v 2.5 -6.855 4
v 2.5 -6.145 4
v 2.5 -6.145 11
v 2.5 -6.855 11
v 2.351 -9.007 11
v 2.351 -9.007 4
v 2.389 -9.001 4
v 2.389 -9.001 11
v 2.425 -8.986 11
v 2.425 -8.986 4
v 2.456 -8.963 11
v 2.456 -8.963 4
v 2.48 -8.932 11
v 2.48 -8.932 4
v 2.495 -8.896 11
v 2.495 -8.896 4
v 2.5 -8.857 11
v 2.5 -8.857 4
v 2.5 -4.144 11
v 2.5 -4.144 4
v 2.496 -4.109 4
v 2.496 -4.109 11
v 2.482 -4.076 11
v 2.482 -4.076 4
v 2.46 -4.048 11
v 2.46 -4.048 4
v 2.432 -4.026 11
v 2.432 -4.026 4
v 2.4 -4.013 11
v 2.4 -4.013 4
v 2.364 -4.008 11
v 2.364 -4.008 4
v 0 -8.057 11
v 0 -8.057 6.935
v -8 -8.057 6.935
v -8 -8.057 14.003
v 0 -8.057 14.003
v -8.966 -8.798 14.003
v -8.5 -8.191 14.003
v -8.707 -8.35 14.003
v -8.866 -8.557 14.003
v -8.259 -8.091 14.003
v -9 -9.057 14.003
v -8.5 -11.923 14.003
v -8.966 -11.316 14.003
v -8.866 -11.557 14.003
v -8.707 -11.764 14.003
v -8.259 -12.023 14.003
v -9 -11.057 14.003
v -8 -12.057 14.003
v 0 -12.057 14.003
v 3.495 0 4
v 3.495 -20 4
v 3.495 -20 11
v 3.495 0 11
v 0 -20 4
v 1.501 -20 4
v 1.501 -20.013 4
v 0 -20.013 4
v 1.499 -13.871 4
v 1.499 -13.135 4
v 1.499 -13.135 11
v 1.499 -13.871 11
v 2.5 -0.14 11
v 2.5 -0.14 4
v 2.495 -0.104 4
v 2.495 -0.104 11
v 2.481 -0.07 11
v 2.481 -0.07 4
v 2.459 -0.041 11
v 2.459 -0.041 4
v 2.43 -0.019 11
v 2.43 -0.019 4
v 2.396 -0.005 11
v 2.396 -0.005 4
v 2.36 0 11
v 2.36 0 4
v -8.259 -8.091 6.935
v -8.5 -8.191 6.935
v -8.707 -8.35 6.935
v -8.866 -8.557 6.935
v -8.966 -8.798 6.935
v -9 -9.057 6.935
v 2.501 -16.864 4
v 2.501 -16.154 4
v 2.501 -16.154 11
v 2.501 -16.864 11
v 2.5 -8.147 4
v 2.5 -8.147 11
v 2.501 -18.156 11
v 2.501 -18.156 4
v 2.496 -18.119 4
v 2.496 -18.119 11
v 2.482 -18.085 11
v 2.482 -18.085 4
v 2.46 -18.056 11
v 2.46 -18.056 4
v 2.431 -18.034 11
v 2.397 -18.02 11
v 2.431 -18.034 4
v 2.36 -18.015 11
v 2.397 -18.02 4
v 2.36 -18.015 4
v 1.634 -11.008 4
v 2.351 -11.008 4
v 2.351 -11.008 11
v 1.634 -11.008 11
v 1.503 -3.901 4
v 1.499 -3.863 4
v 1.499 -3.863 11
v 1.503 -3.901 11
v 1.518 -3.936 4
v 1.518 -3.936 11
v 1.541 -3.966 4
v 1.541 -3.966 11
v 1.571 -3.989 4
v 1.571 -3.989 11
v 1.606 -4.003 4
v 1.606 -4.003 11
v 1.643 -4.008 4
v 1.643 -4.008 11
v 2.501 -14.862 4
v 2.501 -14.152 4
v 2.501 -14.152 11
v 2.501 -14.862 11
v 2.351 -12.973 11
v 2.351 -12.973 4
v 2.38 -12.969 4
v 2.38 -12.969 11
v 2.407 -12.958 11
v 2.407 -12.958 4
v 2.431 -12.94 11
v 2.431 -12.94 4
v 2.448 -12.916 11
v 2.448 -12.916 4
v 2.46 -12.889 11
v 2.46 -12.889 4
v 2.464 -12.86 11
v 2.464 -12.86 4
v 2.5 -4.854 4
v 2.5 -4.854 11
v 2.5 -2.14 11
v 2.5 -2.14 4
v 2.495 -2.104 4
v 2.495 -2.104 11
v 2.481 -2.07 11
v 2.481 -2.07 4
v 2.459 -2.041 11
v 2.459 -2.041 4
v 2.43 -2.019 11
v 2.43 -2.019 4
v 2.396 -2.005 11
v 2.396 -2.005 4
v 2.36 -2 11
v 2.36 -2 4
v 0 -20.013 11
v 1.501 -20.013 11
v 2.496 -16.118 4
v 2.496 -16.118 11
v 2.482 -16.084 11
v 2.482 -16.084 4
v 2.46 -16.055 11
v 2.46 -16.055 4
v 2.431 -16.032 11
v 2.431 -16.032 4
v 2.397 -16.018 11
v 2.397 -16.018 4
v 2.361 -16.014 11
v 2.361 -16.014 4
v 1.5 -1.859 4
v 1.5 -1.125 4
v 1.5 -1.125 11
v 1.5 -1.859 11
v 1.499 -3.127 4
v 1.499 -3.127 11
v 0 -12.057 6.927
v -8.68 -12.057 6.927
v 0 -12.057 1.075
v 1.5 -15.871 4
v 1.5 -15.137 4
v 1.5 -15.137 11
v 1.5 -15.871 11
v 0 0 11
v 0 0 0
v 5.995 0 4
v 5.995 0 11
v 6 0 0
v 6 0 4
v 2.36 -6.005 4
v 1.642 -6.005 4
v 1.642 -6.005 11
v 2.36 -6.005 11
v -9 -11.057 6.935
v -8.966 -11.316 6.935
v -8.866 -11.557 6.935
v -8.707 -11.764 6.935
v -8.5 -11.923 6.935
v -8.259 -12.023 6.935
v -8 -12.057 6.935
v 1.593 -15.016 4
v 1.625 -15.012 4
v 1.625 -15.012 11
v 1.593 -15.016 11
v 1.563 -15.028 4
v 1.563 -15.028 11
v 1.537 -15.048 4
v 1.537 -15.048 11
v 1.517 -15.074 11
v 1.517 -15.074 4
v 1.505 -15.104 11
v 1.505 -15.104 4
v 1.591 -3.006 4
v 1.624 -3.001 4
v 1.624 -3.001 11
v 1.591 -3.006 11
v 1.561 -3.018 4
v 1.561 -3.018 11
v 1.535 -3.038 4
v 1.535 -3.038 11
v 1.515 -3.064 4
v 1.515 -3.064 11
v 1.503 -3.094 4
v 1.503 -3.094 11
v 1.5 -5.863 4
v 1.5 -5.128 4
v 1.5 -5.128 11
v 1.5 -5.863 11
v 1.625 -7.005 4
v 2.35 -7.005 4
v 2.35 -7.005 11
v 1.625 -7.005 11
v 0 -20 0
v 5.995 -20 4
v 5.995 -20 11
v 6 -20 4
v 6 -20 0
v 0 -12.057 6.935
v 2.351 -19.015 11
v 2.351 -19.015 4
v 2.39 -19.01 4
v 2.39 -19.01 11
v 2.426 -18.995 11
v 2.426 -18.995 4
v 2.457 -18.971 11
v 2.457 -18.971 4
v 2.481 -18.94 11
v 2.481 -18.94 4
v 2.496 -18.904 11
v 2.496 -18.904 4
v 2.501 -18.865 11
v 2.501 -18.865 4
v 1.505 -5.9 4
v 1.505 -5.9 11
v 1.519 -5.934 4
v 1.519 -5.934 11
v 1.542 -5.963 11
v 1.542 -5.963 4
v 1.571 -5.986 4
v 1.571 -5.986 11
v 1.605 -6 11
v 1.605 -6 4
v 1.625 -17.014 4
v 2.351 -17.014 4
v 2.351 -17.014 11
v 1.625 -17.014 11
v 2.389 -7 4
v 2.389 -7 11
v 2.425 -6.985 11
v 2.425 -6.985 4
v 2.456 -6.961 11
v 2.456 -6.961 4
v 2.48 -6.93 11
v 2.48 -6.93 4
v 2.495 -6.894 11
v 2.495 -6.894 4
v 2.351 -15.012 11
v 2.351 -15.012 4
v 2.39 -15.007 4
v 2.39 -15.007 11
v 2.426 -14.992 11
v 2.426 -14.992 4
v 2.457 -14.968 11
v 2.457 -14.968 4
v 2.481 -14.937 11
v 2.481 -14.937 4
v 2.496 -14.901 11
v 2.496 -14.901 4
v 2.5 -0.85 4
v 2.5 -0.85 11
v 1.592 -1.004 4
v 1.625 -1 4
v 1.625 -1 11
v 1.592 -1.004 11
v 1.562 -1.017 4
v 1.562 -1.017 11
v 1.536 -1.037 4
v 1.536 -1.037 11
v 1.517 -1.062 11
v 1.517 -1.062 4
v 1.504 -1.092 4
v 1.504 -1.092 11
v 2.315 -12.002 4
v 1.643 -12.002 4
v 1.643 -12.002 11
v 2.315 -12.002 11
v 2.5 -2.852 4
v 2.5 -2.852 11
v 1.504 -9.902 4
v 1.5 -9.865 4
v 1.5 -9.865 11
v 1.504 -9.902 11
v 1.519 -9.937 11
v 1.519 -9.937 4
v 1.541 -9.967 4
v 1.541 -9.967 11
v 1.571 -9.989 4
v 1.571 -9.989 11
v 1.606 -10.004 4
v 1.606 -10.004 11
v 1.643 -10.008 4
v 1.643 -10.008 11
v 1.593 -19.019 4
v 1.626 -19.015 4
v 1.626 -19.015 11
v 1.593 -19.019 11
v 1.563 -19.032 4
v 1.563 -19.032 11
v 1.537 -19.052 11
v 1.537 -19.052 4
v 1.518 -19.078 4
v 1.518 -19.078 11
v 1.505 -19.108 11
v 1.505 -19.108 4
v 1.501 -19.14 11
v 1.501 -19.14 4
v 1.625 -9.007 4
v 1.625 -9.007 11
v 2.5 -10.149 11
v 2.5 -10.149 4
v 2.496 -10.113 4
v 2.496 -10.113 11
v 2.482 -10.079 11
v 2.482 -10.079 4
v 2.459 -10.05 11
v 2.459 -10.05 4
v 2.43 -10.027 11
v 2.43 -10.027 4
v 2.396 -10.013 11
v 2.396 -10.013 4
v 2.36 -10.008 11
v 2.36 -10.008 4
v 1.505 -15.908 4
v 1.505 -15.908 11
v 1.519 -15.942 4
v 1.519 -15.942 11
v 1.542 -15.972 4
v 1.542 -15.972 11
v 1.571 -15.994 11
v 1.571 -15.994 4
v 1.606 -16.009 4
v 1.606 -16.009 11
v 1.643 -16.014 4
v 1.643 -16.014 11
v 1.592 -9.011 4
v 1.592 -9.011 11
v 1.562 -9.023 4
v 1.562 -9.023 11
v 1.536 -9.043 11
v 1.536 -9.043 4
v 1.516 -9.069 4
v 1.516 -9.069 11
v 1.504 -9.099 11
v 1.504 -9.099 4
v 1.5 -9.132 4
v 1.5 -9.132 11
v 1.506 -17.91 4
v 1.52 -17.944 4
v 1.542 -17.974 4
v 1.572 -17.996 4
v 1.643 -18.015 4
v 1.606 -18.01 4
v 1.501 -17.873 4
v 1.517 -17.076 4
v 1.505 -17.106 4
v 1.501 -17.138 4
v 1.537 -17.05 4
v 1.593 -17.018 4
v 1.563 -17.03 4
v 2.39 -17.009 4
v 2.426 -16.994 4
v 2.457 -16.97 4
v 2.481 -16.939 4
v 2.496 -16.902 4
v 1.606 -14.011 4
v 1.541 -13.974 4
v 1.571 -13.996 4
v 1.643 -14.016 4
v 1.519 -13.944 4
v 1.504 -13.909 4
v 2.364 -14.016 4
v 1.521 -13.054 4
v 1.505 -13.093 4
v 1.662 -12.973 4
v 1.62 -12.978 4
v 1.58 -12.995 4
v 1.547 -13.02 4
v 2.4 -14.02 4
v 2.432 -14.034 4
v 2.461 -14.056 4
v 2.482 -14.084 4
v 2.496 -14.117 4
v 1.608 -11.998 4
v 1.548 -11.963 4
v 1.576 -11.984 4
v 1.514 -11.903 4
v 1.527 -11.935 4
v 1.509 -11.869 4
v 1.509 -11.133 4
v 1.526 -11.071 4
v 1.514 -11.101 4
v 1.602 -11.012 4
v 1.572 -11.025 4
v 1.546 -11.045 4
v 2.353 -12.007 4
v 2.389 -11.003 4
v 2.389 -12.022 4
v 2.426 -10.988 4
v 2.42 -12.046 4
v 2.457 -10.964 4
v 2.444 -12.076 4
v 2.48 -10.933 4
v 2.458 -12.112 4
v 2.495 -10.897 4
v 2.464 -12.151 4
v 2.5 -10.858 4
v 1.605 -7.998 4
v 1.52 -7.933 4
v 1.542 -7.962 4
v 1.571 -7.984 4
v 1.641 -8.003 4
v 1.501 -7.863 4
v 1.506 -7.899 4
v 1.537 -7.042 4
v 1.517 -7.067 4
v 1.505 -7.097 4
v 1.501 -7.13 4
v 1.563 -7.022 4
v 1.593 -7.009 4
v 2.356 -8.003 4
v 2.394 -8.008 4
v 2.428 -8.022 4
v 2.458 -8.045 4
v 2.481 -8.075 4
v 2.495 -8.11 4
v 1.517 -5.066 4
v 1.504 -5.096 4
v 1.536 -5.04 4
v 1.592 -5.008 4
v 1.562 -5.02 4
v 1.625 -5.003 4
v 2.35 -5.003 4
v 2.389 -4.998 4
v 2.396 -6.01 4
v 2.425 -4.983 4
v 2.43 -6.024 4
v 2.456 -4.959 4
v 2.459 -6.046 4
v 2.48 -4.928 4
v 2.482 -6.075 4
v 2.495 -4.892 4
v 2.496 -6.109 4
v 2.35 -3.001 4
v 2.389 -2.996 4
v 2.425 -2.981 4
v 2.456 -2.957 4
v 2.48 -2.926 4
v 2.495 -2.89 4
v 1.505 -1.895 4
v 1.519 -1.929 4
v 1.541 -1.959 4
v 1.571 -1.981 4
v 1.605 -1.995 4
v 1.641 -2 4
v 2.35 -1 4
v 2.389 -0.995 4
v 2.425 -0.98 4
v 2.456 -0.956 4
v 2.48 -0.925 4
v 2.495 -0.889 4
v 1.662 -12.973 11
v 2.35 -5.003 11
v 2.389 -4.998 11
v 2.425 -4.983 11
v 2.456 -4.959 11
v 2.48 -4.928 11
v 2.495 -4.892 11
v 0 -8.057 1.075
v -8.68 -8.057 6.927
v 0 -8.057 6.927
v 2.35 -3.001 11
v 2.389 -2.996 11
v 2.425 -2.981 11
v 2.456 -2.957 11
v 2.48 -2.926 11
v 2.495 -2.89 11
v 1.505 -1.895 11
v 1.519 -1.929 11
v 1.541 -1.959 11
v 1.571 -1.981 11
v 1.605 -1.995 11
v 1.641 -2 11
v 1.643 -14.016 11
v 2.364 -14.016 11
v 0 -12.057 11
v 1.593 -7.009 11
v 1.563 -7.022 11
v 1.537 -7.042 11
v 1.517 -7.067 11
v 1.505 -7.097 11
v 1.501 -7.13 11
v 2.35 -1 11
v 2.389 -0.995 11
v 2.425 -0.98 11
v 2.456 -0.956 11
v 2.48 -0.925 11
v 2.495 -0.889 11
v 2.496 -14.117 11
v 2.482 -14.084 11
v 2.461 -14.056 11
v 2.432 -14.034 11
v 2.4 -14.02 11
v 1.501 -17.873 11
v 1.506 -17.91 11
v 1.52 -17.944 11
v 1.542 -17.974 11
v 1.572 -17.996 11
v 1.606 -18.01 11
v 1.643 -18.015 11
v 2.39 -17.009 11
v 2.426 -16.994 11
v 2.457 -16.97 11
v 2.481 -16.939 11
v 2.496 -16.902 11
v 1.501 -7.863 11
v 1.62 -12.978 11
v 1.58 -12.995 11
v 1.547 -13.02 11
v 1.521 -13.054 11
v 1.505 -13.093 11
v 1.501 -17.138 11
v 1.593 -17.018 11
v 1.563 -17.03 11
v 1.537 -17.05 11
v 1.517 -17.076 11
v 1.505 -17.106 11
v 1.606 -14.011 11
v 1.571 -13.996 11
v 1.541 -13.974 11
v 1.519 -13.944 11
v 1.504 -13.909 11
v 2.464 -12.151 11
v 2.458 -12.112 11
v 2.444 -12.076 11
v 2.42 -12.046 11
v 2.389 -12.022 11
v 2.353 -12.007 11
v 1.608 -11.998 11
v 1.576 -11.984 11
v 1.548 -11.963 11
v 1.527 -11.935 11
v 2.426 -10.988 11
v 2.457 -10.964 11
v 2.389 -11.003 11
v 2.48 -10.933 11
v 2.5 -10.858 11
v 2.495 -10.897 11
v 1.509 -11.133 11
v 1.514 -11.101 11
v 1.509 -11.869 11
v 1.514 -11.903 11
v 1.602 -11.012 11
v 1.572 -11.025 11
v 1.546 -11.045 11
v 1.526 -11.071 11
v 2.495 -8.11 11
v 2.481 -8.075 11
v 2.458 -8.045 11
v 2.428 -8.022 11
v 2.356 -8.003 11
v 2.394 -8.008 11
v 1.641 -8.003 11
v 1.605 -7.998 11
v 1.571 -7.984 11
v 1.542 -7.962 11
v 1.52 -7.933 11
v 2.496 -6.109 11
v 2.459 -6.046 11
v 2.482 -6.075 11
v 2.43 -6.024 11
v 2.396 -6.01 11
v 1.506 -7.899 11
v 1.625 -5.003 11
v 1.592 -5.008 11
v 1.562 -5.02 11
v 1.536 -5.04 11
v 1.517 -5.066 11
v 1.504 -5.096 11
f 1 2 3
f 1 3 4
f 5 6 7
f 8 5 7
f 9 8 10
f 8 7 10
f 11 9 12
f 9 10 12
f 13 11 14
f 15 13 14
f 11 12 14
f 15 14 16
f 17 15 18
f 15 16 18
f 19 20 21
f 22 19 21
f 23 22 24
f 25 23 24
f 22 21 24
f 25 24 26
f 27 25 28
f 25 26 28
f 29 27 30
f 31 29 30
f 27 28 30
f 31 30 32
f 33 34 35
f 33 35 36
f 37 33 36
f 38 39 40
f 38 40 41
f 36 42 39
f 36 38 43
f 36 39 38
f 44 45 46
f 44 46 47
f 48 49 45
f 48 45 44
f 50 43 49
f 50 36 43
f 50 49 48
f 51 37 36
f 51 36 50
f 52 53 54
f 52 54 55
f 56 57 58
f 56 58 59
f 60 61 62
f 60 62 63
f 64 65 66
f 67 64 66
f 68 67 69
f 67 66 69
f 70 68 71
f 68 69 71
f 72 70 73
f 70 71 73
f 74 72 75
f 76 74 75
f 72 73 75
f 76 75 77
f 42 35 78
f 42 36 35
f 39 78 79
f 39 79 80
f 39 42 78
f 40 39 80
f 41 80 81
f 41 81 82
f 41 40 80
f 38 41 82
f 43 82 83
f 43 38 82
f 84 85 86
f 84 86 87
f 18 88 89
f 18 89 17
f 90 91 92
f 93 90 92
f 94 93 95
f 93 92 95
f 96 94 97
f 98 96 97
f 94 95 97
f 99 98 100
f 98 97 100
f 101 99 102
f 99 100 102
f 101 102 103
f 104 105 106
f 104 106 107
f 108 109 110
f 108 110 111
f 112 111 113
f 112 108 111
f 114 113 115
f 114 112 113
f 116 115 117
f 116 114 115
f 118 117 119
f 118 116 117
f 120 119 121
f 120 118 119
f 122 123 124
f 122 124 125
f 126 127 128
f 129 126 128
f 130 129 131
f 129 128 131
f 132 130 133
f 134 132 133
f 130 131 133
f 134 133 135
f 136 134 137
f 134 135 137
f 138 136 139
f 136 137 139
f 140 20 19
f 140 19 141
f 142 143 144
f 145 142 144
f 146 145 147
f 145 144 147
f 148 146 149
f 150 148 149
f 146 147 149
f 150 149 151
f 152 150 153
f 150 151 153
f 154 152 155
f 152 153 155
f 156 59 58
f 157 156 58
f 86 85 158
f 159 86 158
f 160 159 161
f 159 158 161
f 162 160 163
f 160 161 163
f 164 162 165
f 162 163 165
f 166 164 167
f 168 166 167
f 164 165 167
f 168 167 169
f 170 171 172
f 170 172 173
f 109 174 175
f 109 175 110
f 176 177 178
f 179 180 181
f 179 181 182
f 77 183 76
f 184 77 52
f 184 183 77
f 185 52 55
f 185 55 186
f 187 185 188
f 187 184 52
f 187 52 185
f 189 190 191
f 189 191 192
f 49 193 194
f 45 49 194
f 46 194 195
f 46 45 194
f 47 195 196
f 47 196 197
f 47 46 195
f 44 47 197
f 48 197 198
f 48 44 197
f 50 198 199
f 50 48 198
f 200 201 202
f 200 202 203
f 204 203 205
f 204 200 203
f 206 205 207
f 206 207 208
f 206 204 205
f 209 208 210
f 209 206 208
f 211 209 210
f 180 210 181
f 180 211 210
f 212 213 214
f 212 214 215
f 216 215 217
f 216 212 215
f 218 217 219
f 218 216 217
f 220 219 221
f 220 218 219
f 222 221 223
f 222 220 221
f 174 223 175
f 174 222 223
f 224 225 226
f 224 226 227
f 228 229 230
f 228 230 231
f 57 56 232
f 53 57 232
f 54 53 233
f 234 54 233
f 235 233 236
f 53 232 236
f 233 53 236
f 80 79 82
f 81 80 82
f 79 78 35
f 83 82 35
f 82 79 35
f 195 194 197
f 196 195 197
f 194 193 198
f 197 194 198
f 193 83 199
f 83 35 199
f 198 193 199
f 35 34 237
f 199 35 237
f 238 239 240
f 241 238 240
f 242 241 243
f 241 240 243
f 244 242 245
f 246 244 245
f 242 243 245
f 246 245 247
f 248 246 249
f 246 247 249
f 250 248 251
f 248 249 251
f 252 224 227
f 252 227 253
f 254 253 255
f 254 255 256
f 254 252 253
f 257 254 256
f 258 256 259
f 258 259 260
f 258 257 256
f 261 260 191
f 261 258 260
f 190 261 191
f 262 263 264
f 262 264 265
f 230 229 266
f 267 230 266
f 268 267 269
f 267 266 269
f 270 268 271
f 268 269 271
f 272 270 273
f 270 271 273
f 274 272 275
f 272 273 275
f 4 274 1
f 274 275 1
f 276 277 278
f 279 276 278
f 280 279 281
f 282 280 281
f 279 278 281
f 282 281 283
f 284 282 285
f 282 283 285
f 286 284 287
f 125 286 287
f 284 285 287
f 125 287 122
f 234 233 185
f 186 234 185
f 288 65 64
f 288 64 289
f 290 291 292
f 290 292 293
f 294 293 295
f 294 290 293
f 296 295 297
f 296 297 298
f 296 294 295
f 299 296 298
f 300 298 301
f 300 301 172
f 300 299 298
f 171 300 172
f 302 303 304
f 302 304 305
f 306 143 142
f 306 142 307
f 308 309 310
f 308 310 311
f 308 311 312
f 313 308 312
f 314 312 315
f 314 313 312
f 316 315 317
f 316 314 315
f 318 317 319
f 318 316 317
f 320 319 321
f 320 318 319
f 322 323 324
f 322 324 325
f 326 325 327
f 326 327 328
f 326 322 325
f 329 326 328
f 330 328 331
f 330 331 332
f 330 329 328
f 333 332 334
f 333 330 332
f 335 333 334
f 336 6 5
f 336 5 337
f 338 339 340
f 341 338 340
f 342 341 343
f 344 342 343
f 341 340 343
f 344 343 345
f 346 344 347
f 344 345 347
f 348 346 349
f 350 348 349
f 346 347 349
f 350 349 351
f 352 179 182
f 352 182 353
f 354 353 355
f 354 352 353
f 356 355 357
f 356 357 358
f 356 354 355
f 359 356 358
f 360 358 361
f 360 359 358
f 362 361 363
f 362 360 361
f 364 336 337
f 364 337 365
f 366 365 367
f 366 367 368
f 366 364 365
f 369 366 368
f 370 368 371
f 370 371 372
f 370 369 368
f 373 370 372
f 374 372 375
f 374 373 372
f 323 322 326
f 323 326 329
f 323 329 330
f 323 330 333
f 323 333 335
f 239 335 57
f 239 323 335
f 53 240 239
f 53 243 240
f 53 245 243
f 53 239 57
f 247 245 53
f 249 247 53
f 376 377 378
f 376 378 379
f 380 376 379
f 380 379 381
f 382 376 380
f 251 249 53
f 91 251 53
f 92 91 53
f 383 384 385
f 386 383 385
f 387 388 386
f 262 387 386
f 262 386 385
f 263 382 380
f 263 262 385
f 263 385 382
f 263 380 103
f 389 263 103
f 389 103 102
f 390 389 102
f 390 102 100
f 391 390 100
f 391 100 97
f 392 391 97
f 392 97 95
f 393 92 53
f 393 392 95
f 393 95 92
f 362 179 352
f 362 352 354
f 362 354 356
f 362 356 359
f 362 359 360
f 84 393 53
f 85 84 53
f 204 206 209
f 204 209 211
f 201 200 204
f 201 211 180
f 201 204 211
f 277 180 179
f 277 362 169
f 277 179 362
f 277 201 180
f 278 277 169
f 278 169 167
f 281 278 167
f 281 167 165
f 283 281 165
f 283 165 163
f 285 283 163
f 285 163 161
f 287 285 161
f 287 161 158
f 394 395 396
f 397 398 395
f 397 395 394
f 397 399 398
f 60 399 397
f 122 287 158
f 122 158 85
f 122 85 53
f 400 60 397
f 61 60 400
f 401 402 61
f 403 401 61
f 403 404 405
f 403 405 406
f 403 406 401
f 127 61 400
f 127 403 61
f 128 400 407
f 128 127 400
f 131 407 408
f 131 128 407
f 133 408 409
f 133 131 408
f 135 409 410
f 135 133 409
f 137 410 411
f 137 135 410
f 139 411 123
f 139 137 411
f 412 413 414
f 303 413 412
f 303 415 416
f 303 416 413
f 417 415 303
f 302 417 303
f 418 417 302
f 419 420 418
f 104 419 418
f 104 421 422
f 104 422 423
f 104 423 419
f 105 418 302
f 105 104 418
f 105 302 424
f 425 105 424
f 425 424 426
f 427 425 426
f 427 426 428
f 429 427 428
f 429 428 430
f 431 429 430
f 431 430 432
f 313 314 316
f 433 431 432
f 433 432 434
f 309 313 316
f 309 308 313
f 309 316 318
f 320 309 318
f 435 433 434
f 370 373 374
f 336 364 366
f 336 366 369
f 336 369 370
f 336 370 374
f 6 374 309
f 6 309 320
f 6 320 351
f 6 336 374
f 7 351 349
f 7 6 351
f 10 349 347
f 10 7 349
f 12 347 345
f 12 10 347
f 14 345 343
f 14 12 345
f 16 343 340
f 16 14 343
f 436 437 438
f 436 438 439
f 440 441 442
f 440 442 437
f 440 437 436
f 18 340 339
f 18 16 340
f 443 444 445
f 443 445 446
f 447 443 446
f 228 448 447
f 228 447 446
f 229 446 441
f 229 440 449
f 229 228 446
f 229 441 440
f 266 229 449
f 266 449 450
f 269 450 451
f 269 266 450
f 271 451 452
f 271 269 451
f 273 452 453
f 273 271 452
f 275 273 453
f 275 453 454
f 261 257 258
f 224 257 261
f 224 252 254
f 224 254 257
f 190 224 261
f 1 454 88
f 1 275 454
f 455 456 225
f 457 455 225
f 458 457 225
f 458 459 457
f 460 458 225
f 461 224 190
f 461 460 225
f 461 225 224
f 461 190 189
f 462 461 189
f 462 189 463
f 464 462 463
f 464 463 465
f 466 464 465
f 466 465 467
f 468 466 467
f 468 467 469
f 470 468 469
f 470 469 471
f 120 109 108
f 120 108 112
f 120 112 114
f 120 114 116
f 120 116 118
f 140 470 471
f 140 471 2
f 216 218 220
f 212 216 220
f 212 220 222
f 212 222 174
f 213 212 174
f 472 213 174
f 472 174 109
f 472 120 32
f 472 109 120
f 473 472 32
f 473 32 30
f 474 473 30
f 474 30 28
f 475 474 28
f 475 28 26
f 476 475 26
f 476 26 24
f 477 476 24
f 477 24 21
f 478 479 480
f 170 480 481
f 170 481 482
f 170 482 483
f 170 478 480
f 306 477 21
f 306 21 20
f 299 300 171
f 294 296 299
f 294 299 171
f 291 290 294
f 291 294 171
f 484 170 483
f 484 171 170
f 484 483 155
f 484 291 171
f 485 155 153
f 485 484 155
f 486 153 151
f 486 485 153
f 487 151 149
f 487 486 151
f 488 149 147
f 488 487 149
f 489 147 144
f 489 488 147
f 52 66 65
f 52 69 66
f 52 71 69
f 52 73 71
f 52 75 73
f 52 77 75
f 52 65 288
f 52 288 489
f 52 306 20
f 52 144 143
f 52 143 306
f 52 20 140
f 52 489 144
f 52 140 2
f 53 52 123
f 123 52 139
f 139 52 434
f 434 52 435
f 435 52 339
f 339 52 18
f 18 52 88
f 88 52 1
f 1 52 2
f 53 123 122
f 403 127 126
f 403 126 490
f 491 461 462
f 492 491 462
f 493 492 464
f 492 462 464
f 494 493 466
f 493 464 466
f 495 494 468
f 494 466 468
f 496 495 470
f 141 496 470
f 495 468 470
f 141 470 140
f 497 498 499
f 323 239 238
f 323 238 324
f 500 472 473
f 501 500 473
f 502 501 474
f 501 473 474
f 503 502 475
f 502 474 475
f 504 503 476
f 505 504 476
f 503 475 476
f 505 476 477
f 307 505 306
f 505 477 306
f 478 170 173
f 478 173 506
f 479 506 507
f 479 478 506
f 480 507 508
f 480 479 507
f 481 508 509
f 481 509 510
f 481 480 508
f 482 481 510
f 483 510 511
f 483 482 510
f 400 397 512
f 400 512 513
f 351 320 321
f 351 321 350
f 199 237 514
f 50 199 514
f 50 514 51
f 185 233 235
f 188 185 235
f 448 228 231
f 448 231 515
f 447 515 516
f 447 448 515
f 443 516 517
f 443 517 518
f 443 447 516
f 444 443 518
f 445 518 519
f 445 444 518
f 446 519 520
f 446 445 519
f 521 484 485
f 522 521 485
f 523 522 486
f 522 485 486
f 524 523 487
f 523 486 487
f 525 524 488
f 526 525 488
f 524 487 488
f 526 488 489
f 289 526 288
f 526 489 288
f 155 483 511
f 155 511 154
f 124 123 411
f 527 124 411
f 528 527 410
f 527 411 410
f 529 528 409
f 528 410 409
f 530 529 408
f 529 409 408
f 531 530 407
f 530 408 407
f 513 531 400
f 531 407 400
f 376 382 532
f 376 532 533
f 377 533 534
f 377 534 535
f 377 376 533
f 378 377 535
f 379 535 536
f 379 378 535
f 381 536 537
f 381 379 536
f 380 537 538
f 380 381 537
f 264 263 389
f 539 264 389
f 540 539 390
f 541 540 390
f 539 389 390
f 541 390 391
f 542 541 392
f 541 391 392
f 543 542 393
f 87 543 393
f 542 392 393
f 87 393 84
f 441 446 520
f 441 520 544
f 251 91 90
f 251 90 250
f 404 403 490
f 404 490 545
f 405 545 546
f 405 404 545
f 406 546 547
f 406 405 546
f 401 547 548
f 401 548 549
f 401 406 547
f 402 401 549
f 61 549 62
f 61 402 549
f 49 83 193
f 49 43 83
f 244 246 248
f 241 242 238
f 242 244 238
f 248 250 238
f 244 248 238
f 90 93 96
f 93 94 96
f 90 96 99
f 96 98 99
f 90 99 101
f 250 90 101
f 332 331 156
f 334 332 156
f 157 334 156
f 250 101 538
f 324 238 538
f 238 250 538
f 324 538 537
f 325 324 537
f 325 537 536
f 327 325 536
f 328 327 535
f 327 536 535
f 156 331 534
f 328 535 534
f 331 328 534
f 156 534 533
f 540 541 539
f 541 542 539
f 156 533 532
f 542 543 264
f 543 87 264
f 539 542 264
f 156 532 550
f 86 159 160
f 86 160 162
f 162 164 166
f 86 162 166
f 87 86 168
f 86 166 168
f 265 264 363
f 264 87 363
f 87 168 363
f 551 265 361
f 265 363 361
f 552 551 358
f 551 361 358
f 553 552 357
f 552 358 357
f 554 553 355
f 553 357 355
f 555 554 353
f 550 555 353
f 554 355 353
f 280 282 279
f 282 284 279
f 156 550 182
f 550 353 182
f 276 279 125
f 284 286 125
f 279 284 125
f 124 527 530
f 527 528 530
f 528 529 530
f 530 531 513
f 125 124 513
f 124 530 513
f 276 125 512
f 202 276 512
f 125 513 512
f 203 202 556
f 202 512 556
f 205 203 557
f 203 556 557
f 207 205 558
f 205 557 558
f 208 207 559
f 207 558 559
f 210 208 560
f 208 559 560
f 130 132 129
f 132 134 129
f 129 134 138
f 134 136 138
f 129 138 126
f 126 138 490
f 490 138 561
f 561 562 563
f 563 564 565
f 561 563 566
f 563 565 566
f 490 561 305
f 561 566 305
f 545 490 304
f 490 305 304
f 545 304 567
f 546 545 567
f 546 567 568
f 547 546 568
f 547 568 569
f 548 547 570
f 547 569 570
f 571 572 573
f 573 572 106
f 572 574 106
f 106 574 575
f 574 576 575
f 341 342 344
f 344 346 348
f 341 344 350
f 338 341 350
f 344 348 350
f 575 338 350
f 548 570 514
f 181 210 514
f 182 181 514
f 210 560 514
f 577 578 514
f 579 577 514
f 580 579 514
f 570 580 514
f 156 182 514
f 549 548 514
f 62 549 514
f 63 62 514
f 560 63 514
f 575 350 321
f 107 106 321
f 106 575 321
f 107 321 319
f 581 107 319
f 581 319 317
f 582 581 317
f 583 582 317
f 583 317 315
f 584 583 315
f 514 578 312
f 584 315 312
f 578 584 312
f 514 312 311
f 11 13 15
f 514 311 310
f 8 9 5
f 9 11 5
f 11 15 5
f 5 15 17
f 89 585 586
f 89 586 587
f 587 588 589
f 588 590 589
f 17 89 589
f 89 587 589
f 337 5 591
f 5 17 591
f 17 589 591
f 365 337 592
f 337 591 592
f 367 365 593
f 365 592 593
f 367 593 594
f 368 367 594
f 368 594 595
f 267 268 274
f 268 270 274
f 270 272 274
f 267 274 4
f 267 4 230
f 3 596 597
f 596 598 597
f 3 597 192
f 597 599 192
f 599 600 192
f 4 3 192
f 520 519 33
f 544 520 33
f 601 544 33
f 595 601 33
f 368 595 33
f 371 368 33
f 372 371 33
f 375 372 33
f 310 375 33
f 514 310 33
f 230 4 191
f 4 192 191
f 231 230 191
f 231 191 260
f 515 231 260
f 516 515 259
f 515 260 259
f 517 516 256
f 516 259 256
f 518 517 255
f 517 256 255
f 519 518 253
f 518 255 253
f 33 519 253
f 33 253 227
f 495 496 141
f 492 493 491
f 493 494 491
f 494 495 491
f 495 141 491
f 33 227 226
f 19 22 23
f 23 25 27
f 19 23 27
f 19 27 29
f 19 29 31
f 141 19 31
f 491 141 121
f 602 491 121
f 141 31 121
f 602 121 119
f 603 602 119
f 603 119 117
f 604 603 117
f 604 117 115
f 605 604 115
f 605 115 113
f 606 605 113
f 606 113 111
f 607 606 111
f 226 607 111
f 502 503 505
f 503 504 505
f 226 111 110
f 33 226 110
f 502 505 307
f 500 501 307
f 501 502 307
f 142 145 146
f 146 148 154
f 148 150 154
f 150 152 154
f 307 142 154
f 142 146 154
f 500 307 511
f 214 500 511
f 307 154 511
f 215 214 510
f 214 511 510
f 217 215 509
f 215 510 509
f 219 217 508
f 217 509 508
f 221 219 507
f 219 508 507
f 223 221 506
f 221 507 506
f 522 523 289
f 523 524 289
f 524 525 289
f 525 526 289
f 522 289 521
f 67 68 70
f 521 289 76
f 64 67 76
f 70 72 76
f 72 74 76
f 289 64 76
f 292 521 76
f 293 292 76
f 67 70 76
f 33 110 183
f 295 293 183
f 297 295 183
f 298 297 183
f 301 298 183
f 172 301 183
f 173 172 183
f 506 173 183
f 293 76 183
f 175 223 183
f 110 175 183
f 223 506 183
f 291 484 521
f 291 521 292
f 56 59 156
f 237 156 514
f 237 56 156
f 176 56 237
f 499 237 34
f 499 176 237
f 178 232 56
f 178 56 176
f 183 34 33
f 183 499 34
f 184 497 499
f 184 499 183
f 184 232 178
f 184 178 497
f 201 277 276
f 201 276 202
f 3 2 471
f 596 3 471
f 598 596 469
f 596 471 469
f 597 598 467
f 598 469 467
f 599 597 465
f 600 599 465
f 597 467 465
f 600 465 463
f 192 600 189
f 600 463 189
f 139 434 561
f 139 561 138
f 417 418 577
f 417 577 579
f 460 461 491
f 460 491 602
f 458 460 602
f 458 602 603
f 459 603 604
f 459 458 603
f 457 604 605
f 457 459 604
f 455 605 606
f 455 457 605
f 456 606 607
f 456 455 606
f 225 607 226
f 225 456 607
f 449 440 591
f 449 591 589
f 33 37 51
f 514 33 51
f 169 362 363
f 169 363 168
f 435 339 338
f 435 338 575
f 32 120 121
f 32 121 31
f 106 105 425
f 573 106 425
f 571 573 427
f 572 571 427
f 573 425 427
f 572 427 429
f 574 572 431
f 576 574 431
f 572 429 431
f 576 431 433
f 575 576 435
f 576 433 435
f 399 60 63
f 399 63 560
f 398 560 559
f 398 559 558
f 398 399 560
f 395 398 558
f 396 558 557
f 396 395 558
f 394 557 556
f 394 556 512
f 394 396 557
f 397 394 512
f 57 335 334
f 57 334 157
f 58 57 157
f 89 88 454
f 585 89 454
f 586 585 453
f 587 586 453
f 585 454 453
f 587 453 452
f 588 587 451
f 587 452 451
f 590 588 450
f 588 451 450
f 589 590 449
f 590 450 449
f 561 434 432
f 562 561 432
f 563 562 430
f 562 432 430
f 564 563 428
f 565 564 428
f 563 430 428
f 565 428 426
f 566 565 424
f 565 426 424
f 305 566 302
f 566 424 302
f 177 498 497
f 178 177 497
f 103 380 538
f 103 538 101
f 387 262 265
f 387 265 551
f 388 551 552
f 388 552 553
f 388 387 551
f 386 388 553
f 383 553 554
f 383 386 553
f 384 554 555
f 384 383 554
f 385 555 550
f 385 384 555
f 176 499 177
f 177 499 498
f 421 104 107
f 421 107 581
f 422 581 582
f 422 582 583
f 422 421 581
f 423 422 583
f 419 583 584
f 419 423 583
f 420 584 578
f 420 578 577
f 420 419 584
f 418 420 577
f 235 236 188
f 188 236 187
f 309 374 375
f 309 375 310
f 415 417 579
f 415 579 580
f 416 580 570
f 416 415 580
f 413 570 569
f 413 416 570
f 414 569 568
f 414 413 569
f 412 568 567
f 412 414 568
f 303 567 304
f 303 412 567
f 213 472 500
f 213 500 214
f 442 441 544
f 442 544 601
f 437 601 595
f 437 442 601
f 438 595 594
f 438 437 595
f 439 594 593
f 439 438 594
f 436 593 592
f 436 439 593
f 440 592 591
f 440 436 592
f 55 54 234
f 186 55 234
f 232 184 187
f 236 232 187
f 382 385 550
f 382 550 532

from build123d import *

# Parameters (mm, degrees)
SKETCH_W     = 6
SKETCH_H     = 20
PAD_DEPTH    = 4
PAD001_DEPTH = 7
SKETCH002_W  = 2.5
SKETCH002_H  = 20
PAD002_DEPTH = 7
SKETCH003_W  = 4
SKETCH003_H  = 7.068021
PAD003_DEPTH = 9
PAD004_DEPTH = 4
FILLET_R     = 1
FILLET001_R  = 1


with BuildPart() as part:
    # Sketch → Pad (new body)
    with BuildSketch(Plane.XY):
        with Locations((3, -10)):
            Rectangle(SKETCH_W, SKETCH_H)
    extrude(amount=PAD_DEPTH)

    # Sketch001 (on Face6 of Pad) → Pad001 (join)
    with BuildSketch(Plane.XY.offset(4)):
        with BuildLine():
            Line((0, 0), (2.35958, 0))
            ThreePointArc((2.5, -0.14042), (2.458872, -0.041128), (2.35958, 0))
            Line((2.5, -0.14042), (2.5, -0.850163))
            ThreePointArc((2.350164, -0.999998), (2.456114, -0.956113), (2.5, -0.850163))
            Line((2.350164, -0.999998), (1.624627, -0.999998))
            ThreePointArc((1.624627, -0.999998), (1.536498, -1.036503), (1.499994, -1.124632))
            Line((1.499994, -1.124632), (1.499994, -1.858533))
            ThreePointArc((1.499994, -1.858533), (1.541436, -1.958583), (1.641485, -2.000025))
            Line((1.641485, -2.000025), (2.359631, -2.000025))
            ThreePointArc((2.5, -2.140395), (2.458887, -2.041139), (2.359631, -2.000025))
            Line((2.5, -2.140395), (2.5, -2.851653))
            ThreePointArc((2.350363, -3.00129), (2.456173, -2.957463), (2.5, -2.851653))
            Line((2.350363, -3.00129), (1.623935, -3.00129))
            ThreePointArc((1.623935, -3.00129), (1.535246, -3.038027), (1.49851, -3.126716))
            Line((1.49851, -3.126716), (1.49851, -3.86339))
            ThreePointArc((1.49851, -3.86339), (1.54088, -3.965679), (1.643169, -4.008049))
            Line((1.643169, -4.008049), (2.364441, -4.008049))
            ThreePointArc((2.500184, -4.143792), (2.460426, -4.047807), (2.364441, -4.008049))
            Line((2.500184, -4.143792), (2.500184, -4.853508))
            ThreePointArc((2.35038, -5.003311), (2.456307, -4.959435), (2.500184, -4.853508))
            Line((2.35038, -5.003311), (1.6247, -5.003311))
            ThreePointArc((1.6247, -5.003311), (1.536481, -5.039852), (1.49994, -5.128071))
            Line((1.49994, -5.128071), (1.49994, -5.863058))
            ThreePointArc((1.49994, -5.863058), (1.541531, -5.963466), (1.641939, -6.005056))
            Line((1.641939, -6.005056), (2.359895, -6.005056))
            ThreePointArc((2.50033, -6.145492), (2.459198, -6.046189), (2.359895, -6.005056))
            Line((2.50033, -6.145492), (2.50033, -6.855288))
            ThreePointArc((2.350434, -7.005184), (2.456427, -6.961281), (2.50033, -6.855288))
            Line((2.350434, -7.005184), (1.625171, -7.005184))
            ThreePointArc((1.625171, -7.005184), (1.537215, -7.041617), (1.500782, -7.129574))
            Line((1.500782, -7.129574), (1.500782, -7.862621))
            ThreePointArc((1.500782, -7.862621), (1.541938, -7.96198), (1.641297, -8.003136))
            Line((1.641297, -8.003136), (2.356324, -8.003136))
            ThreePointArc((2.500346, -8.147159), (2.458163, -8.04532), (2.356324, -8.003136))
            Line((2.500346, -8.147159), (2.500346, -8.856808))
            ThreePointArc((2.350618, -9.006537), (2.456492, -8.962682), (2.500346, -8.856808))
            Line((2.350618, -9.006537), (1.624599, -9.006537))
            ThreePointArc((1.624599, -9.006537), (1.536168, -9.043166), (1.499538, -9.131597))
            Line((1.499538, -9.131597), (1.499538, -9.865251))
            ThreePointArc((1.499538, -9.865251), (1.541481, -9.966511), (1.642741, -10.008454))
            Line((1.642741, -10.008454), (2.360053, -10.008454))
            ThreePointArc((2.500444, -10.148846), (2.459325, -10.049574), (2.360053, -10.008454))
            Line((2.500444, -10.148846), (2.500444, -10.858493))
            ThreePointArc((2.35072, -11.008218), (2.456591, -10.964364), (2.500444, -10.858493))
            Line((2.35072, -11.008218), (1.634349, -11.008218))
            ThreePointArc((1.634349, -11.008218), (1.545907, -11.044851), (1.509274, -11.133292))
            Line((1.509274, -11.133292), (1.509274, -11.86852))
            ThreePointArc((1.509274, -11.86852), (1.548403, -11.962986), (1.642869, -12.002116))
            Line((1.642869, -12.002116), (2.314983, -12.002116))
            ThreePointArc((2.46352, -12.150526), (2.420007, -12.045539), (2.314983, -12.002116))
            Line((2.46352, -12.150526), (2.46352, -12.860116))
            ThreePointArc((2.350852, -12.972783), (2.43052, -12.939784), (2.46352, -12.860116))
            Line((2.350852, -12.972783), (1.661516, -12.972783))
            ThreePointArc((1.661516, -12.972783), (1.546733, -13.020328), (1.499189, -13.135111))
            Line((1.499189, -13.135111), (1.499189, -13.871471))
            ThreePointArc((1.499189, -13.871471), (1.541454, -13.973508), (1.64349, -14.015773))
            Line((1.64349, -14.015773), (2.364217, -14.015773))
            ThreePointArc((2.500673, -14.152229), (2.460706, -14.05574), (2.364217, -14.015773))
            Line((2.500673, -14.152229), (2.500673, -14.861927))
            ThreePointArc((2.350891, -15.011709), (2.456803, -14.967839), (2.500673, -14.861927))
            Line((2.350891, -15.011709), (1.625116, -15.011709))
            ThreePointArc((1.625116, -15.011709), (1.536839, -15.048275), (1.500273, -15.136553))
            Line((1.500273, -15.136553), (1.500273, -15.871192))
            ThreePointArc((1.500273, -15.871192), (1.541957, -15.971828), (1.642593, -16.013512))
            Line((1.642593, -16.013512), (2.360814, -16.013512))
            ThreePointArc((2.501217, -16.153916), (2.460093, -16.054636), (2.360814, -16.013512))
            Line((2.501217, -16.153916), (2.501217, -16.863601))
            ThreePointArc((2.350997, -17.01382), (2.457218, -16.969822), (2.501217, -16.863601))
            Line((2.350997, -17.01382), (1.625163, -17.01382))
            ThreePointArc((1.625163, -17.01382), (1.537165, -17.05027), (1.500715, -17.138268))
            Line((1.500715, -17.138268), (1.500715, -17.873094))
            ThreePointArc((1.500715, -17.873094), (1.542335, -17.973572), (1.642813, -18.015192))
            Line((1.642813, -18.015192), (2.36048, -18.015192))
            ThreePointArc((2.5009, -18.155612), (2.459772, -18.05632), (2.36048, -18.015192))
            Line((2.5009, -18.155612), (2.5009, -18.865356))
            ThreePointArc((2.351064, -19.015192), (2.457014, -18.971306), (2.5009, -18.865356))
            Line((2.351064, -19.015192), (1.62553, -19.015192))
            ThreePointArc((1.62553, -19.015192), (1.537403, -19.051695), (1.5009, -19.139822))
            Line((1.5009, -19.139822), (1.5009, -20.013354))
            Line((0, -20.013354), (1.5009, -20.013354))
            Line((0, -20.013354), (0, 0))
        make_face()
    extrude(amount=PAD001_DEPTH)

    # Sketch002 (on Face6 of Pad001) → Pad002 (join)
    with BuildSketch(Plane.XY.offset(4)):
        with Locations((4.74459, -10)):
            Rectangle(SKETCH002_W, SKETCH002_H)
    extrude(amount=PAD002_DEPTH)

    # Sketch003 (on Face10 of Pad002) → Pad003 (join)
    with BuildSketch(Plane(origin=(0, 0, 0), x_dir=(0, -1, 0), z_dir=(-1, 0, 0))):
        with Locations((10.057235, 10.469196)):
            Rectangle(SKETCH003_W, SKETCH003_H)
    extrude(amount=PAD003_DEPTH)

    # Sketch004 (on Face95 of Pad003) → Pad004 (join)
    with BuildSketch(Plane(origin=(0, -8.057235, 0), x_dir=(-1, 0, 0), z_dir=(0, 1, 0))):
        Polygon((8.679756, 6.927178), (0, 1.075306), (0, 6.927178), align=None)
    extrude(amount=-PAD004_DEPTH)

    # Fillet
    fillet_edges = [part.edges().sort_by_distance(p)[0] for p in [
        (-9, -8.057235, 10.469196),
    ]]
    fillet(fillet_edges, radius=FILLET_R)

    # Fillet001
    fillet001_edges = [part.edges().sort_by_distance(p)[0] for p in [
        (-9, -12.057235, 10.469196),
    ]]
    fillet(fillet001_edges, radius=FILLET001_R)


solid = part.part
